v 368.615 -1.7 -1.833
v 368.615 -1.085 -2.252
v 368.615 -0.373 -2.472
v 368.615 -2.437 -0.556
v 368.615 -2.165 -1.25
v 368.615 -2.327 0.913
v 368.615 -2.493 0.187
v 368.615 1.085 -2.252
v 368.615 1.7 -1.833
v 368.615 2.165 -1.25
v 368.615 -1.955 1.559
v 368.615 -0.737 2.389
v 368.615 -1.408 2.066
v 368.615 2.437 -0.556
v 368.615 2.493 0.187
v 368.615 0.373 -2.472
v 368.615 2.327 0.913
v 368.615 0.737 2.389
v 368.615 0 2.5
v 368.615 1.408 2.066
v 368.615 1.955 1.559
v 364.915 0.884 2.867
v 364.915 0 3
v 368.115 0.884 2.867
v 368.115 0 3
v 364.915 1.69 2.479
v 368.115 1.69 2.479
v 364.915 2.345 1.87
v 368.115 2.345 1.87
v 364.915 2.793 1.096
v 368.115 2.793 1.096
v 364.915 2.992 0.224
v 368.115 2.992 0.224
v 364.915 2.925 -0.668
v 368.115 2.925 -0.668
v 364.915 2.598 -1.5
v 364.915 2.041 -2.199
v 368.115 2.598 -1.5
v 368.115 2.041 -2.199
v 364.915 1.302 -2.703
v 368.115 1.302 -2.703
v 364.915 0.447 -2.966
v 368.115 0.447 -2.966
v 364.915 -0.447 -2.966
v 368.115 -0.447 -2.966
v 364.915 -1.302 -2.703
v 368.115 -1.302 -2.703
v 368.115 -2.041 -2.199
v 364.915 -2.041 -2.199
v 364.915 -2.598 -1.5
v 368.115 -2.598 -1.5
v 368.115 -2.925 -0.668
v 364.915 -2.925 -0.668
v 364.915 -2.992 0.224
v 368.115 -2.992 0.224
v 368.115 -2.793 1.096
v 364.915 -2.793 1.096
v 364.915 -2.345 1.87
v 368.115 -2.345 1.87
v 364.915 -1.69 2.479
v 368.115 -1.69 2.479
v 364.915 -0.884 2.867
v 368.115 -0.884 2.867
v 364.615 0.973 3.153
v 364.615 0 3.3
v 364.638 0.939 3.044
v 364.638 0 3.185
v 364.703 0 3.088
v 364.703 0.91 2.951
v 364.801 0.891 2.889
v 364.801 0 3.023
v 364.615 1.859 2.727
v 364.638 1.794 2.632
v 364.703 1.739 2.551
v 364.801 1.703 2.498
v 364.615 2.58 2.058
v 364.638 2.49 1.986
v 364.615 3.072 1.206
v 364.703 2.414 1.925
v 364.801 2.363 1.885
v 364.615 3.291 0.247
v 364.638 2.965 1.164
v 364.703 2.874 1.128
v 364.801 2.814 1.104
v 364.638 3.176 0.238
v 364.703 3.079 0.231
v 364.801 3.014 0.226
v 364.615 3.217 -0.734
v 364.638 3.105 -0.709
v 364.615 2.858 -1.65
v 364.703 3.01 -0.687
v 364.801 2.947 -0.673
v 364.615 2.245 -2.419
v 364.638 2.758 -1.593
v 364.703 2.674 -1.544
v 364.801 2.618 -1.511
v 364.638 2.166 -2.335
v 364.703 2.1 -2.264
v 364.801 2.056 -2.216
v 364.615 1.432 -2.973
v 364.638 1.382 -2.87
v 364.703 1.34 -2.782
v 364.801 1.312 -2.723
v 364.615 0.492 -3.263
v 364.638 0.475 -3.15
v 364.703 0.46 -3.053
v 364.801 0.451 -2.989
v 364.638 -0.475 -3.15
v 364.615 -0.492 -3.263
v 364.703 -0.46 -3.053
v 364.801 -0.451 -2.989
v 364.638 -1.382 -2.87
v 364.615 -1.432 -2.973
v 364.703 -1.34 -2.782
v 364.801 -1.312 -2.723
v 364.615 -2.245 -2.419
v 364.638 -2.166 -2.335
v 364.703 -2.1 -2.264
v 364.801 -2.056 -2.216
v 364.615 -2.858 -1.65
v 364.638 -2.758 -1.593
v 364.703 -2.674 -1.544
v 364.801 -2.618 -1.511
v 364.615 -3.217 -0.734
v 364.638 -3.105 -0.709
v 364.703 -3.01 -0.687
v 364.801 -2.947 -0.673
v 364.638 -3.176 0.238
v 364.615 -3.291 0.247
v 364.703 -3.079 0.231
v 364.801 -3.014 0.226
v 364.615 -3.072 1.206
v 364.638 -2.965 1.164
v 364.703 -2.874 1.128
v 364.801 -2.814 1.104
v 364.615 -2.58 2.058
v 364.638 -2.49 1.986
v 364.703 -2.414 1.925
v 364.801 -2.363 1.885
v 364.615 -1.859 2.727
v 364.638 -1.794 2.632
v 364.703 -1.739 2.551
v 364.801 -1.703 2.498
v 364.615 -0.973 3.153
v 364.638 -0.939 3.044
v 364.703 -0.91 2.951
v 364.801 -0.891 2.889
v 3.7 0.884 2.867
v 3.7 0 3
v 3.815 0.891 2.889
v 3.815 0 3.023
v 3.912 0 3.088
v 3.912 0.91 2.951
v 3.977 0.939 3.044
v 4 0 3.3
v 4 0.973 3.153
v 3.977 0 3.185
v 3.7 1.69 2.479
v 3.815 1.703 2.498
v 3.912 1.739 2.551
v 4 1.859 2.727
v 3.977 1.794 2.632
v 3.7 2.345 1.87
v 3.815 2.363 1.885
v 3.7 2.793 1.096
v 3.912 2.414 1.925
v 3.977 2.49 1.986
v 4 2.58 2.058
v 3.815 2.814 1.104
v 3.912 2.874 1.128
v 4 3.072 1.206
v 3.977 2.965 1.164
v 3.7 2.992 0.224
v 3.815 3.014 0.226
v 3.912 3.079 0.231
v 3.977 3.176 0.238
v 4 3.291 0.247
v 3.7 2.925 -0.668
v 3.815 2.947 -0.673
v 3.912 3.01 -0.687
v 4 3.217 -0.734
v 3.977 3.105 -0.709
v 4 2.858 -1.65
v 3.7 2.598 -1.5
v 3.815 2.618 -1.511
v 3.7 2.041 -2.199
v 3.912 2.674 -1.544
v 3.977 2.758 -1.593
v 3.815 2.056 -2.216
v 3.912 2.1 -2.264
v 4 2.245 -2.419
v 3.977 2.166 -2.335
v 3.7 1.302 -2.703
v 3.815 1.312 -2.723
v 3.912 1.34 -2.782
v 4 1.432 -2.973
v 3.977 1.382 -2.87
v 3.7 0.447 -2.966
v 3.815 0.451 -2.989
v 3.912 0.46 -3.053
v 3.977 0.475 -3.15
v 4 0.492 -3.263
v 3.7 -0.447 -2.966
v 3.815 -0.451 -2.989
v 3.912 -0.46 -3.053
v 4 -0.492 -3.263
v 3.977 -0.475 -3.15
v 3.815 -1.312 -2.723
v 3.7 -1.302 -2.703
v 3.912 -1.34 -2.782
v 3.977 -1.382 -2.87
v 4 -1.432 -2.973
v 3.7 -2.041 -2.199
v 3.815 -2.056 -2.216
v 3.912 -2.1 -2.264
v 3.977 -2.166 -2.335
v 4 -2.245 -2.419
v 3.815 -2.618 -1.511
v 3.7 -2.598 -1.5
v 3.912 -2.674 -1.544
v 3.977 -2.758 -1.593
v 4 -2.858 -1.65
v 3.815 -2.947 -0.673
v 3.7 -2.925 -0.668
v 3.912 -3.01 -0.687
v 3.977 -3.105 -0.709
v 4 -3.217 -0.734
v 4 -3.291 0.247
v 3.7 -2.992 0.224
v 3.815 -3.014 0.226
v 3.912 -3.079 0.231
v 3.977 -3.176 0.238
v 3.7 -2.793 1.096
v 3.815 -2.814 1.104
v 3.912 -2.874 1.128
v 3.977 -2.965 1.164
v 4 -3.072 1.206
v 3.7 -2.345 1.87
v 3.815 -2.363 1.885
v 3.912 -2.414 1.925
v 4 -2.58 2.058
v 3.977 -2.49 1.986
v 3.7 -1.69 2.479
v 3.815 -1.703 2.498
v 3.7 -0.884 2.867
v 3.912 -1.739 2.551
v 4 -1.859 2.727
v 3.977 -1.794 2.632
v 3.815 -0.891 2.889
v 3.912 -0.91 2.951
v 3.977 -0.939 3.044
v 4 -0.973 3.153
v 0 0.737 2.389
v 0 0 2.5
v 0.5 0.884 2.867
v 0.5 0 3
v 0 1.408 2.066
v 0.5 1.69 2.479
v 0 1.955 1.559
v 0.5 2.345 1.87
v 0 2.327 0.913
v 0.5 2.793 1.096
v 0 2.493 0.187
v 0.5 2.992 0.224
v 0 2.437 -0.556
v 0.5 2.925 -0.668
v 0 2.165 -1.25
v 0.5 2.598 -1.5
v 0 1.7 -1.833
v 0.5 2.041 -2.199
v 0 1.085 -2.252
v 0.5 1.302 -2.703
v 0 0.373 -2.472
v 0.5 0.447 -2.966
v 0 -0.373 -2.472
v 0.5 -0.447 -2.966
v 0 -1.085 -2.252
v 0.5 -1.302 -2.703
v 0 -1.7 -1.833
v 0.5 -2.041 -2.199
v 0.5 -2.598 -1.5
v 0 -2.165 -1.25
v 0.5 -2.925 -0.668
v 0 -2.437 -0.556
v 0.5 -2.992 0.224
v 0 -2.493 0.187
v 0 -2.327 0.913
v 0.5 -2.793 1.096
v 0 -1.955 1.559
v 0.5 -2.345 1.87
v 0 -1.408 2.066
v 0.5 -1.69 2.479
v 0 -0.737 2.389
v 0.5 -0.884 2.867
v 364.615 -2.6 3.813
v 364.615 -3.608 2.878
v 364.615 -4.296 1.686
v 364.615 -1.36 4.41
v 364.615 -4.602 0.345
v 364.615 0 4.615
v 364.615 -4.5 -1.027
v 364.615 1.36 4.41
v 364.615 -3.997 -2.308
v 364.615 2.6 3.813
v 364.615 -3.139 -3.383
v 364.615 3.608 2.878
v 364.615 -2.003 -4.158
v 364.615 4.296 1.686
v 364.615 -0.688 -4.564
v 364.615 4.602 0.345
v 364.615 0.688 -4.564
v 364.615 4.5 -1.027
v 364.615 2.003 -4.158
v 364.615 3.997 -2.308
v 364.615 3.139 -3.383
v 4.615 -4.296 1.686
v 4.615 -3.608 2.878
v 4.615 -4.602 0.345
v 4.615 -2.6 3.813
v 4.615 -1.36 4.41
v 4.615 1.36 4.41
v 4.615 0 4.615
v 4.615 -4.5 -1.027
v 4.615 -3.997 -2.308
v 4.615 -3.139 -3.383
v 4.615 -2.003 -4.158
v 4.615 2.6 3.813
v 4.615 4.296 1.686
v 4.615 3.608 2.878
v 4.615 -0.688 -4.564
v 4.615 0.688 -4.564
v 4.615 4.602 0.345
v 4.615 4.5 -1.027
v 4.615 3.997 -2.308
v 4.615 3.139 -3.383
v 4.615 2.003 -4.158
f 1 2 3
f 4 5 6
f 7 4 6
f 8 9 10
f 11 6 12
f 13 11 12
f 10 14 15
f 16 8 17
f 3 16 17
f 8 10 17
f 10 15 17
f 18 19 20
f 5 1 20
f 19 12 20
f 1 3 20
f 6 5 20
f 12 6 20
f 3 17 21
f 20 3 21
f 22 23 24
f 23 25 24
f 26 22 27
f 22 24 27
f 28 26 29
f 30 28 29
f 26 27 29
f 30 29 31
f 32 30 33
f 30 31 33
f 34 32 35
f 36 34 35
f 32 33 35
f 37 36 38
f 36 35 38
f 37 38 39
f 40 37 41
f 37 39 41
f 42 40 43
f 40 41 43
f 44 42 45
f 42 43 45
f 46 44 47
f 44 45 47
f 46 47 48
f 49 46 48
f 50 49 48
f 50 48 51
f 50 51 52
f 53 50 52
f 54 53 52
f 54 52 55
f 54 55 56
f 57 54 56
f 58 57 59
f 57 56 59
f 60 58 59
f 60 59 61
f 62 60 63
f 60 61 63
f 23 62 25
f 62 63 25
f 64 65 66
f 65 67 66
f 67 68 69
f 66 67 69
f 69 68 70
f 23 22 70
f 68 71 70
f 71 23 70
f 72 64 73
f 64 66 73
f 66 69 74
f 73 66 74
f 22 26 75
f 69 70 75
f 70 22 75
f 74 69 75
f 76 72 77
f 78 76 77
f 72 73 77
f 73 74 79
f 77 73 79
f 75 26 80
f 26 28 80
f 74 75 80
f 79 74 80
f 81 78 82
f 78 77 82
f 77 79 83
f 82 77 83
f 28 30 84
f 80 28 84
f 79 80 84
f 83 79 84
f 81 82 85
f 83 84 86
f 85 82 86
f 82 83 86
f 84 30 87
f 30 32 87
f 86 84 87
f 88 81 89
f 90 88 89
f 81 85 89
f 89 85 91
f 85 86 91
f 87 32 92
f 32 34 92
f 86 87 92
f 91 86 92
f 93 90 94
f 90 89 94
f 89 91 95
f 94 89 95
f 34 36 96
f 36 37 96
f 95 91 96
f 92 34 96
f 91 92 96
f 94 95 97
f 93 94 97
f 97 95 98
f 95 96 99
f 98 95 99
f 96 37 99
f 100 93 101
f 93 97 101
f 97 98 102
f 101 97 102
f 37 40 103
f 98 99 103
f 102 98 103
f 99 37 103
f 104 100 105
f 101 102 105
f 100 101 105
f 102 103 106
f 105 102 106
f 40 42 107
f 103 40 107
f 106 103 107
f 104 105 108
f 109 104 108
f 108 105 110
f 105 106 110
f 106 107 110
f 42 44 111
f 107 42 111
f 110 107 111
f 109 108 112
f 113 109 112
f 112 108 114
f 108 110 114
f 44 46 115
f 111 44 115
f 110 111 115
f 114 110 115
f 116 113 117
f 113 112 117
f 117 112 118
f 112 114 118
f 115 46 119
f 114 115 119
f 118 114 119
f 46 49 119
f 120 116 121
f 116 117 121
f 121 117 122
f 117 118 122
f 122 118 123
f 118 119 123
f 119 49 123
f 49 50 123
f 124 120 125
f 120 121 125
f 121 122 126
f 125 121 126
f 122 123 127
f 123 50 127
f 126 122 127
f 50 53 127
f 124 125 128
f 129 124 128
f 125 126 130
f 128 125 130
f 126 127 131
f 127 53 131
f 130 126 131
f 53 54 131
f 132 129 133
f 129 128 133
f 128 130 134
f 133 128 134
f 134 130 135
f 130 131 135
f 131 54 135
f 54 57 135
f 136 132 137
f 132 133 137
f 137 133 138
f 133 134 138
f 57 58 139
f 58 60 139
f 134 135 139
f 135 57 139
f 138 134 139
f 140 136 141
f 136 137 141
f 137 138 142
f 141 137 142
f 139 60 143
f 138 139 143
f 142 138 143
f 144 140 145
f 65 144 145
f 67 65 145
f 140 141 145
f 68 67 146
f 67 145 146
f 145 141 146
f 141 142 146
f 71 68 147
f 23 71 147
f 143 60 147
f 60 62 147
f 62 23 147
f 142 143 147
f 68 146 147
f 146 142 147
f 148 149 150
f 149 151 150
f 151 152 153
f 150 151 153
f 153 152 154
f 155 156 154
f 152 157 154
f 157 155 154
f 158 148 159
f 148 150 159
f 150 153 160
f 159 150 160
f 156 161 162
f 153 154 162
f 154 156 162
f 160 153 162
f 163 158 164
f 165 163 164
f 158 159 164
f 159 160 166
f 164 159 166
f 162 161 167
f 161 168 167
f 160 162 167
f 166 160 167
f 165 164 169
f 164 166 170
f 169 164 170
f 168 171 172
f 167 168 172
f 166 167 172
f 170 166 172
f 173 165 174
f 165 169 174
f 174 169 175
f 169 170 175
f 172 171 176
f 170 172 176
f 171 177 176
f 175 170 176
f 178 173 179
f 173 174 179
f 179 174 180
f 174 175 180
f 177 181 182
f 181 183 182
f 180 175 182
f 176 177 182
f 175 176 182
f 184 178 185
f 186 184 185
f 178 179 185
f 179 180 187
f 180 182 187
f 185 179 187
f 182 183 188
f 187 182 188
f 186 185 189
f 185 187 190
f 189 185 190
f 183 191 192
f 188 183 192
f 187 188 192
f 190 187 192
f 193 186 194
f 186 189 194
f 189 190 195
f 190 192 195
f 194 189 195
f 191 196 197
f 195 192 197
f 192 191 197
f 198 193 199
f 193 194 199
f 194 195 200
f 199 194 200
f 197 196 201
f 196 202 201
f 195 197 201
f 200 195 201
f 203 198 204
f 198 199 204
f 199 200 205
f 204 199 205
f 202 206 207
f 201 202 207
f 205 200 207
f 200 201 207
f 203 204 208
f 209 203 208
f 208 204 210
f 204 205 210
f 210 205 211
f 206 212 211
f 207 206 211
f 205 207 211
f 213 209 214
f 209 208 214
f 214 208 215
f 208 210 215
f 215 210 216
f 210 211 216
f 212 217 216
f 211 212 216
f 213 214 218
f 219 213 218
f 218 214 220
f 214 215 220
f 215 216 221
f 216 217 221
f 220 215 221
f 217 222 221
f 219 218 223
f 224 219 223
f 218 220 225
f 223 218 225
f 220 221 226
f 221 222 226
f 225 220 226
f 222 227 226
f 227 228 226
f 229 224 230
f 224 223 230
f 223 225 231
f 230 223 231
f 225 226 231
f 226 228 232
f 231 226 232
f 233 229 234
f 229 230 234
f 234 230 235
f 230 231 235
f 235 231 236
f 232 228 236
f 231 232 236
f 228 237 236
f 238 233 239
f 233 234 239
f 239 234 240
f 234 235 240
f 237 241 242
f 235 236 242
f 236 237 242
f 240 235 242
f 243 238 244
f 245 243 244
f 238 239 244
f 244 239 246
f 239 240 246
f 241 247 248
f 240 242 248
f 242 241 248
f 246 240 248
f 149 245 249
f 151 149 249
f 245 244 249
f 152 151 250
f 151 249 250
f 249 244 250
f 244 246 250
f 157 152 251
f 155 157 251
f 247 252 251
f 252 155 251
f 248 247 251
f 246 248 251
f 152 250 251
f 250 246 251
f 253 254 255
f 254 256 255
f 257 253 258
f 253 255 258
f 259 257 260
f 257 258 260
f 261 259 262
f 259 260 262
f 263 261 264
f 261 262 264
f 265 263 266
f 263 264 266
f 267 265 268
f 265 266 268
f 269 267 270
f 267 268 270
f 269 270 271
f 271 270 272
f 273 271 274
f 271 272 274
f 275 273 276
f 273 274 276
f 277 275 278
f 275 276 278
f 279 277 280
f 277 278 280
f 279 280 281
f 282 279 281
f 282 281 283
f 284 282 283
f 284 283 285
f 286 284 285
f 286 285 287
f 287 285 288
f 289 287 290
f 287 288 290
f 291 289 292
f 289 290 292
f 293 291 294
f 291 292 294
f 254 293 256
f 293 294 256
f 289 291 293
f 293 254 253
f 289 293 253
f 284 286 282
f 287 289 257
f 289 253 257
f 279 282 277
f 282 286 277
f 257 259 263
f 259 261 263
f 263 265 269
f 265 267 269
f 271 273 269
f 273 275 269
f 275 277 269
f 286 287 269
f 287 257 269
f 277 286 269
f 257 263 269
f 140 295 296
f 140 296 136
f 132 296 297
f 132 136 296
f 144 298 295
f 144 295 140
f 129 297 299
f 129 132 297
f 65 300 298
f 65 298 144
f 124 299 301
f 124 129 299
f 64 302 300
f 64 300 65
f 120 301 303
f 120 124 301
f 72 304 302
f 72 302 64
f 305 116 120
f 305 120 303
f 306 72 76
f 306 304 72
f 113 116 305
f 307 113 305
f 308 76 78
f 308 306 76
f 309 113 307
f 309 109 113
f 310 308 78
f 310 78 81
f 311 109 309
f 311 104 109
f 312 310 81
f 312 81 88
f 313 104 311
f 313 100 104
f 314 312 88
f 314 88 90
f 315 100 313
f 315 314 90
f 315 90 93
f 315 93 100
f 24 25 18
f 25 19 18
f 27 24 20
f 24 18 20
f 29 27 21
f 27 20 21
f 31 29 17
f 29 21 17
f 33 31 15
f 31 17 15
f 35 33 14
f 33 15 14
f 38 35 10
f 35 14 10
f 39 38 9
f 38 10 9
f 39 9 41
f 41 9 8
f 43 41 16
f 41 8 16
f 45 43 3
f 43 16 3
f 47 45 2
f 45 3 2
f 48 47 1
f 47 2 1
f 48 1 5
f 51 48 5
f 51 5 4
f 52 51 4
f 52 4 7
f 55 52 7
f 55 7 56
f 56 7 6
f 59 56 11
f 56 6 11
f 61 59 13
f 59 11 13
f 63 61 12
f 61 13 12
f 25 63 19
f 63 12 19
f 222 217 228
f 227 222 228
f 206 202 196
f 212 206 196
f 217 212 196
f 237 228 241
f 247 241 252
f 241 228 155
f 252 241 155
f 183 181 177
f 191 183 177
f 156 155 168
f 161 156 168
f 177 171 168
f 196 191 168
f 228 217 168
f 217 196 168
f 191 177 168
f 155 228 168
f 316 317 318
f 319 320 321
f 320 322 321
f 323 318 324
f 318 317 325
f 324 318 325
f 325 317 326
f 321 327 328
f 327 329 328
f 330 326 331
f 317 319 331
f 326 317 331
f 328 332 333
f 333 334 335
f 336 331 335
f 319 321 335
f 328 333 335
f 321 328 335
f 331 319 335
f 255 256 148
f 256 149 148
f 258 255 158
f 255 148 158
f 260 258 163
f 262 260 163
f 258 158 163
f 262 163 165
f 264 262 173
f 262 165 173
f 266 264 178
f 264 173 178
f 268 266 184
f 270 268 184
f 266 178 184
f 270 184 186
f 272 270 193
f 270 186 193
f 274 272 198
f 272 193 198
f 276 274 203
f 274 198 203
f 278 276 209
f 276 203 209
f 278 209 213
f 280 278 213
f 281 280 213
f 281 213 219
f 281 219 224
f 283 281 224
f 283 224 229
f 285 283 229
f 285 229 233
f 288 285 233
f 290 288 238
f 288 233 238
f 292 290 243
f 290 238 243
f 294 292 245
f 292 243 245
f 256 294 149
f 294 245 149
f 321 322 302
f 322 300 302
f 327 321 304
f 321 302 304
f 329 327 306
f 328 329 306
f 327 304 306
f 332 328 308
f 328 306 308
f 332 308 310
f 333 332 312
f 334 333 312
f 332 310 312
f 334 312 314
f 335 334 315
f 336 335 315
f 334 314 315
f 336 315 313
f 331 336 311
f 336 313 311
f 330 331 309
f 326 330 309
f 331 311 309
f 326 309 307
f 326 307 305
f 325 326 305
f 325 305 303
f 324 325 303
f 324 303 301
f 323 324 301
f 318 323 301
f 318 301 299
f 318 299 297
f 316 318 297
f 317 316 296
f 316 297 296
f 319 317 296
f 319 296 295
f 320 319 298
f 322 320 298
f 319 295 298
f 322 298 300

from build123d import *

# Parameters (mm, degrees)
SKETCH1_W = 360
SKETCH1_H = 4.615384615


with BuildPart() as part:
    # Sketch1 → Revolve1 (revolve)
    with BuildSketch(Plane.XY, mode=Mode.PRIVATE) as revolve1_sk:
        with Locations((184.615384615, 2.307692307)):
            Rectangle(SKETCH1_W, SKETCH1_H)
    revolve(revolve1_sk.sketch.rotate(Axis((364.615384615, 0, 0), (-1, 0, 0)), 270), axis=Axis((364.615384615, 0, 0), (-1, 0, 0)))

    # Sketch3 → Revolve3 (revolve)
    with BuildSketch(Plane.XY, mode=Mode.PRIVATE) as revolve3_sk:
        with BuildLine():
            Line((364.615384615, 0), (364.615384615, 3.3))
            ThreePointArc((364.615384615, 3.3), (364.703252581, 3.087867966), (364.915384615, 3))
            Line((364.915384615, 3), (368.115384615, 3))
            Line((368.115384615, 3), (368.615384615, 2.5))
            Line((368.615384615, 2.5), (368.615384615, 0))
            Line((368.615384615, 0), (364.615384615, 0))
        make_face()
    revolve(revolve3_sk.sketch.rotate(Axis((368.615384615, 0, 0), (-1, 0, 0)), 270), axis=Axis((368.615384615, 0, 0), (-1, 0, 0)))


with BuildPart() as body_2:
    # Sketch2 → Revolve2 (revolve)
    with BuildSketch(Plane.XY, mode=Mode.PRIVATE) as revolve2_sk:
        with BuildLine():
            Line((0, 0), (0, 2.5))
            Line((0, 2.5), (0.5, 3))
            Line((0.5, 3), (3.7, 3))
            ThreePointArc((3.7, 3), (3.912132034, 3.087867966), (4, 3.3))
            Line((4, 3.3), (4, 0))
            Line((4, 0), (0, 0))
        make_face()
    revolve(revolve2_sk.sketch.rotate(Axis((4, 0, 0), (-1, 0, 0)), 270), axis=Axis((4, 0, 0), (-1, 0, 0)))


solid = Compound([part.part, body_2.part])
